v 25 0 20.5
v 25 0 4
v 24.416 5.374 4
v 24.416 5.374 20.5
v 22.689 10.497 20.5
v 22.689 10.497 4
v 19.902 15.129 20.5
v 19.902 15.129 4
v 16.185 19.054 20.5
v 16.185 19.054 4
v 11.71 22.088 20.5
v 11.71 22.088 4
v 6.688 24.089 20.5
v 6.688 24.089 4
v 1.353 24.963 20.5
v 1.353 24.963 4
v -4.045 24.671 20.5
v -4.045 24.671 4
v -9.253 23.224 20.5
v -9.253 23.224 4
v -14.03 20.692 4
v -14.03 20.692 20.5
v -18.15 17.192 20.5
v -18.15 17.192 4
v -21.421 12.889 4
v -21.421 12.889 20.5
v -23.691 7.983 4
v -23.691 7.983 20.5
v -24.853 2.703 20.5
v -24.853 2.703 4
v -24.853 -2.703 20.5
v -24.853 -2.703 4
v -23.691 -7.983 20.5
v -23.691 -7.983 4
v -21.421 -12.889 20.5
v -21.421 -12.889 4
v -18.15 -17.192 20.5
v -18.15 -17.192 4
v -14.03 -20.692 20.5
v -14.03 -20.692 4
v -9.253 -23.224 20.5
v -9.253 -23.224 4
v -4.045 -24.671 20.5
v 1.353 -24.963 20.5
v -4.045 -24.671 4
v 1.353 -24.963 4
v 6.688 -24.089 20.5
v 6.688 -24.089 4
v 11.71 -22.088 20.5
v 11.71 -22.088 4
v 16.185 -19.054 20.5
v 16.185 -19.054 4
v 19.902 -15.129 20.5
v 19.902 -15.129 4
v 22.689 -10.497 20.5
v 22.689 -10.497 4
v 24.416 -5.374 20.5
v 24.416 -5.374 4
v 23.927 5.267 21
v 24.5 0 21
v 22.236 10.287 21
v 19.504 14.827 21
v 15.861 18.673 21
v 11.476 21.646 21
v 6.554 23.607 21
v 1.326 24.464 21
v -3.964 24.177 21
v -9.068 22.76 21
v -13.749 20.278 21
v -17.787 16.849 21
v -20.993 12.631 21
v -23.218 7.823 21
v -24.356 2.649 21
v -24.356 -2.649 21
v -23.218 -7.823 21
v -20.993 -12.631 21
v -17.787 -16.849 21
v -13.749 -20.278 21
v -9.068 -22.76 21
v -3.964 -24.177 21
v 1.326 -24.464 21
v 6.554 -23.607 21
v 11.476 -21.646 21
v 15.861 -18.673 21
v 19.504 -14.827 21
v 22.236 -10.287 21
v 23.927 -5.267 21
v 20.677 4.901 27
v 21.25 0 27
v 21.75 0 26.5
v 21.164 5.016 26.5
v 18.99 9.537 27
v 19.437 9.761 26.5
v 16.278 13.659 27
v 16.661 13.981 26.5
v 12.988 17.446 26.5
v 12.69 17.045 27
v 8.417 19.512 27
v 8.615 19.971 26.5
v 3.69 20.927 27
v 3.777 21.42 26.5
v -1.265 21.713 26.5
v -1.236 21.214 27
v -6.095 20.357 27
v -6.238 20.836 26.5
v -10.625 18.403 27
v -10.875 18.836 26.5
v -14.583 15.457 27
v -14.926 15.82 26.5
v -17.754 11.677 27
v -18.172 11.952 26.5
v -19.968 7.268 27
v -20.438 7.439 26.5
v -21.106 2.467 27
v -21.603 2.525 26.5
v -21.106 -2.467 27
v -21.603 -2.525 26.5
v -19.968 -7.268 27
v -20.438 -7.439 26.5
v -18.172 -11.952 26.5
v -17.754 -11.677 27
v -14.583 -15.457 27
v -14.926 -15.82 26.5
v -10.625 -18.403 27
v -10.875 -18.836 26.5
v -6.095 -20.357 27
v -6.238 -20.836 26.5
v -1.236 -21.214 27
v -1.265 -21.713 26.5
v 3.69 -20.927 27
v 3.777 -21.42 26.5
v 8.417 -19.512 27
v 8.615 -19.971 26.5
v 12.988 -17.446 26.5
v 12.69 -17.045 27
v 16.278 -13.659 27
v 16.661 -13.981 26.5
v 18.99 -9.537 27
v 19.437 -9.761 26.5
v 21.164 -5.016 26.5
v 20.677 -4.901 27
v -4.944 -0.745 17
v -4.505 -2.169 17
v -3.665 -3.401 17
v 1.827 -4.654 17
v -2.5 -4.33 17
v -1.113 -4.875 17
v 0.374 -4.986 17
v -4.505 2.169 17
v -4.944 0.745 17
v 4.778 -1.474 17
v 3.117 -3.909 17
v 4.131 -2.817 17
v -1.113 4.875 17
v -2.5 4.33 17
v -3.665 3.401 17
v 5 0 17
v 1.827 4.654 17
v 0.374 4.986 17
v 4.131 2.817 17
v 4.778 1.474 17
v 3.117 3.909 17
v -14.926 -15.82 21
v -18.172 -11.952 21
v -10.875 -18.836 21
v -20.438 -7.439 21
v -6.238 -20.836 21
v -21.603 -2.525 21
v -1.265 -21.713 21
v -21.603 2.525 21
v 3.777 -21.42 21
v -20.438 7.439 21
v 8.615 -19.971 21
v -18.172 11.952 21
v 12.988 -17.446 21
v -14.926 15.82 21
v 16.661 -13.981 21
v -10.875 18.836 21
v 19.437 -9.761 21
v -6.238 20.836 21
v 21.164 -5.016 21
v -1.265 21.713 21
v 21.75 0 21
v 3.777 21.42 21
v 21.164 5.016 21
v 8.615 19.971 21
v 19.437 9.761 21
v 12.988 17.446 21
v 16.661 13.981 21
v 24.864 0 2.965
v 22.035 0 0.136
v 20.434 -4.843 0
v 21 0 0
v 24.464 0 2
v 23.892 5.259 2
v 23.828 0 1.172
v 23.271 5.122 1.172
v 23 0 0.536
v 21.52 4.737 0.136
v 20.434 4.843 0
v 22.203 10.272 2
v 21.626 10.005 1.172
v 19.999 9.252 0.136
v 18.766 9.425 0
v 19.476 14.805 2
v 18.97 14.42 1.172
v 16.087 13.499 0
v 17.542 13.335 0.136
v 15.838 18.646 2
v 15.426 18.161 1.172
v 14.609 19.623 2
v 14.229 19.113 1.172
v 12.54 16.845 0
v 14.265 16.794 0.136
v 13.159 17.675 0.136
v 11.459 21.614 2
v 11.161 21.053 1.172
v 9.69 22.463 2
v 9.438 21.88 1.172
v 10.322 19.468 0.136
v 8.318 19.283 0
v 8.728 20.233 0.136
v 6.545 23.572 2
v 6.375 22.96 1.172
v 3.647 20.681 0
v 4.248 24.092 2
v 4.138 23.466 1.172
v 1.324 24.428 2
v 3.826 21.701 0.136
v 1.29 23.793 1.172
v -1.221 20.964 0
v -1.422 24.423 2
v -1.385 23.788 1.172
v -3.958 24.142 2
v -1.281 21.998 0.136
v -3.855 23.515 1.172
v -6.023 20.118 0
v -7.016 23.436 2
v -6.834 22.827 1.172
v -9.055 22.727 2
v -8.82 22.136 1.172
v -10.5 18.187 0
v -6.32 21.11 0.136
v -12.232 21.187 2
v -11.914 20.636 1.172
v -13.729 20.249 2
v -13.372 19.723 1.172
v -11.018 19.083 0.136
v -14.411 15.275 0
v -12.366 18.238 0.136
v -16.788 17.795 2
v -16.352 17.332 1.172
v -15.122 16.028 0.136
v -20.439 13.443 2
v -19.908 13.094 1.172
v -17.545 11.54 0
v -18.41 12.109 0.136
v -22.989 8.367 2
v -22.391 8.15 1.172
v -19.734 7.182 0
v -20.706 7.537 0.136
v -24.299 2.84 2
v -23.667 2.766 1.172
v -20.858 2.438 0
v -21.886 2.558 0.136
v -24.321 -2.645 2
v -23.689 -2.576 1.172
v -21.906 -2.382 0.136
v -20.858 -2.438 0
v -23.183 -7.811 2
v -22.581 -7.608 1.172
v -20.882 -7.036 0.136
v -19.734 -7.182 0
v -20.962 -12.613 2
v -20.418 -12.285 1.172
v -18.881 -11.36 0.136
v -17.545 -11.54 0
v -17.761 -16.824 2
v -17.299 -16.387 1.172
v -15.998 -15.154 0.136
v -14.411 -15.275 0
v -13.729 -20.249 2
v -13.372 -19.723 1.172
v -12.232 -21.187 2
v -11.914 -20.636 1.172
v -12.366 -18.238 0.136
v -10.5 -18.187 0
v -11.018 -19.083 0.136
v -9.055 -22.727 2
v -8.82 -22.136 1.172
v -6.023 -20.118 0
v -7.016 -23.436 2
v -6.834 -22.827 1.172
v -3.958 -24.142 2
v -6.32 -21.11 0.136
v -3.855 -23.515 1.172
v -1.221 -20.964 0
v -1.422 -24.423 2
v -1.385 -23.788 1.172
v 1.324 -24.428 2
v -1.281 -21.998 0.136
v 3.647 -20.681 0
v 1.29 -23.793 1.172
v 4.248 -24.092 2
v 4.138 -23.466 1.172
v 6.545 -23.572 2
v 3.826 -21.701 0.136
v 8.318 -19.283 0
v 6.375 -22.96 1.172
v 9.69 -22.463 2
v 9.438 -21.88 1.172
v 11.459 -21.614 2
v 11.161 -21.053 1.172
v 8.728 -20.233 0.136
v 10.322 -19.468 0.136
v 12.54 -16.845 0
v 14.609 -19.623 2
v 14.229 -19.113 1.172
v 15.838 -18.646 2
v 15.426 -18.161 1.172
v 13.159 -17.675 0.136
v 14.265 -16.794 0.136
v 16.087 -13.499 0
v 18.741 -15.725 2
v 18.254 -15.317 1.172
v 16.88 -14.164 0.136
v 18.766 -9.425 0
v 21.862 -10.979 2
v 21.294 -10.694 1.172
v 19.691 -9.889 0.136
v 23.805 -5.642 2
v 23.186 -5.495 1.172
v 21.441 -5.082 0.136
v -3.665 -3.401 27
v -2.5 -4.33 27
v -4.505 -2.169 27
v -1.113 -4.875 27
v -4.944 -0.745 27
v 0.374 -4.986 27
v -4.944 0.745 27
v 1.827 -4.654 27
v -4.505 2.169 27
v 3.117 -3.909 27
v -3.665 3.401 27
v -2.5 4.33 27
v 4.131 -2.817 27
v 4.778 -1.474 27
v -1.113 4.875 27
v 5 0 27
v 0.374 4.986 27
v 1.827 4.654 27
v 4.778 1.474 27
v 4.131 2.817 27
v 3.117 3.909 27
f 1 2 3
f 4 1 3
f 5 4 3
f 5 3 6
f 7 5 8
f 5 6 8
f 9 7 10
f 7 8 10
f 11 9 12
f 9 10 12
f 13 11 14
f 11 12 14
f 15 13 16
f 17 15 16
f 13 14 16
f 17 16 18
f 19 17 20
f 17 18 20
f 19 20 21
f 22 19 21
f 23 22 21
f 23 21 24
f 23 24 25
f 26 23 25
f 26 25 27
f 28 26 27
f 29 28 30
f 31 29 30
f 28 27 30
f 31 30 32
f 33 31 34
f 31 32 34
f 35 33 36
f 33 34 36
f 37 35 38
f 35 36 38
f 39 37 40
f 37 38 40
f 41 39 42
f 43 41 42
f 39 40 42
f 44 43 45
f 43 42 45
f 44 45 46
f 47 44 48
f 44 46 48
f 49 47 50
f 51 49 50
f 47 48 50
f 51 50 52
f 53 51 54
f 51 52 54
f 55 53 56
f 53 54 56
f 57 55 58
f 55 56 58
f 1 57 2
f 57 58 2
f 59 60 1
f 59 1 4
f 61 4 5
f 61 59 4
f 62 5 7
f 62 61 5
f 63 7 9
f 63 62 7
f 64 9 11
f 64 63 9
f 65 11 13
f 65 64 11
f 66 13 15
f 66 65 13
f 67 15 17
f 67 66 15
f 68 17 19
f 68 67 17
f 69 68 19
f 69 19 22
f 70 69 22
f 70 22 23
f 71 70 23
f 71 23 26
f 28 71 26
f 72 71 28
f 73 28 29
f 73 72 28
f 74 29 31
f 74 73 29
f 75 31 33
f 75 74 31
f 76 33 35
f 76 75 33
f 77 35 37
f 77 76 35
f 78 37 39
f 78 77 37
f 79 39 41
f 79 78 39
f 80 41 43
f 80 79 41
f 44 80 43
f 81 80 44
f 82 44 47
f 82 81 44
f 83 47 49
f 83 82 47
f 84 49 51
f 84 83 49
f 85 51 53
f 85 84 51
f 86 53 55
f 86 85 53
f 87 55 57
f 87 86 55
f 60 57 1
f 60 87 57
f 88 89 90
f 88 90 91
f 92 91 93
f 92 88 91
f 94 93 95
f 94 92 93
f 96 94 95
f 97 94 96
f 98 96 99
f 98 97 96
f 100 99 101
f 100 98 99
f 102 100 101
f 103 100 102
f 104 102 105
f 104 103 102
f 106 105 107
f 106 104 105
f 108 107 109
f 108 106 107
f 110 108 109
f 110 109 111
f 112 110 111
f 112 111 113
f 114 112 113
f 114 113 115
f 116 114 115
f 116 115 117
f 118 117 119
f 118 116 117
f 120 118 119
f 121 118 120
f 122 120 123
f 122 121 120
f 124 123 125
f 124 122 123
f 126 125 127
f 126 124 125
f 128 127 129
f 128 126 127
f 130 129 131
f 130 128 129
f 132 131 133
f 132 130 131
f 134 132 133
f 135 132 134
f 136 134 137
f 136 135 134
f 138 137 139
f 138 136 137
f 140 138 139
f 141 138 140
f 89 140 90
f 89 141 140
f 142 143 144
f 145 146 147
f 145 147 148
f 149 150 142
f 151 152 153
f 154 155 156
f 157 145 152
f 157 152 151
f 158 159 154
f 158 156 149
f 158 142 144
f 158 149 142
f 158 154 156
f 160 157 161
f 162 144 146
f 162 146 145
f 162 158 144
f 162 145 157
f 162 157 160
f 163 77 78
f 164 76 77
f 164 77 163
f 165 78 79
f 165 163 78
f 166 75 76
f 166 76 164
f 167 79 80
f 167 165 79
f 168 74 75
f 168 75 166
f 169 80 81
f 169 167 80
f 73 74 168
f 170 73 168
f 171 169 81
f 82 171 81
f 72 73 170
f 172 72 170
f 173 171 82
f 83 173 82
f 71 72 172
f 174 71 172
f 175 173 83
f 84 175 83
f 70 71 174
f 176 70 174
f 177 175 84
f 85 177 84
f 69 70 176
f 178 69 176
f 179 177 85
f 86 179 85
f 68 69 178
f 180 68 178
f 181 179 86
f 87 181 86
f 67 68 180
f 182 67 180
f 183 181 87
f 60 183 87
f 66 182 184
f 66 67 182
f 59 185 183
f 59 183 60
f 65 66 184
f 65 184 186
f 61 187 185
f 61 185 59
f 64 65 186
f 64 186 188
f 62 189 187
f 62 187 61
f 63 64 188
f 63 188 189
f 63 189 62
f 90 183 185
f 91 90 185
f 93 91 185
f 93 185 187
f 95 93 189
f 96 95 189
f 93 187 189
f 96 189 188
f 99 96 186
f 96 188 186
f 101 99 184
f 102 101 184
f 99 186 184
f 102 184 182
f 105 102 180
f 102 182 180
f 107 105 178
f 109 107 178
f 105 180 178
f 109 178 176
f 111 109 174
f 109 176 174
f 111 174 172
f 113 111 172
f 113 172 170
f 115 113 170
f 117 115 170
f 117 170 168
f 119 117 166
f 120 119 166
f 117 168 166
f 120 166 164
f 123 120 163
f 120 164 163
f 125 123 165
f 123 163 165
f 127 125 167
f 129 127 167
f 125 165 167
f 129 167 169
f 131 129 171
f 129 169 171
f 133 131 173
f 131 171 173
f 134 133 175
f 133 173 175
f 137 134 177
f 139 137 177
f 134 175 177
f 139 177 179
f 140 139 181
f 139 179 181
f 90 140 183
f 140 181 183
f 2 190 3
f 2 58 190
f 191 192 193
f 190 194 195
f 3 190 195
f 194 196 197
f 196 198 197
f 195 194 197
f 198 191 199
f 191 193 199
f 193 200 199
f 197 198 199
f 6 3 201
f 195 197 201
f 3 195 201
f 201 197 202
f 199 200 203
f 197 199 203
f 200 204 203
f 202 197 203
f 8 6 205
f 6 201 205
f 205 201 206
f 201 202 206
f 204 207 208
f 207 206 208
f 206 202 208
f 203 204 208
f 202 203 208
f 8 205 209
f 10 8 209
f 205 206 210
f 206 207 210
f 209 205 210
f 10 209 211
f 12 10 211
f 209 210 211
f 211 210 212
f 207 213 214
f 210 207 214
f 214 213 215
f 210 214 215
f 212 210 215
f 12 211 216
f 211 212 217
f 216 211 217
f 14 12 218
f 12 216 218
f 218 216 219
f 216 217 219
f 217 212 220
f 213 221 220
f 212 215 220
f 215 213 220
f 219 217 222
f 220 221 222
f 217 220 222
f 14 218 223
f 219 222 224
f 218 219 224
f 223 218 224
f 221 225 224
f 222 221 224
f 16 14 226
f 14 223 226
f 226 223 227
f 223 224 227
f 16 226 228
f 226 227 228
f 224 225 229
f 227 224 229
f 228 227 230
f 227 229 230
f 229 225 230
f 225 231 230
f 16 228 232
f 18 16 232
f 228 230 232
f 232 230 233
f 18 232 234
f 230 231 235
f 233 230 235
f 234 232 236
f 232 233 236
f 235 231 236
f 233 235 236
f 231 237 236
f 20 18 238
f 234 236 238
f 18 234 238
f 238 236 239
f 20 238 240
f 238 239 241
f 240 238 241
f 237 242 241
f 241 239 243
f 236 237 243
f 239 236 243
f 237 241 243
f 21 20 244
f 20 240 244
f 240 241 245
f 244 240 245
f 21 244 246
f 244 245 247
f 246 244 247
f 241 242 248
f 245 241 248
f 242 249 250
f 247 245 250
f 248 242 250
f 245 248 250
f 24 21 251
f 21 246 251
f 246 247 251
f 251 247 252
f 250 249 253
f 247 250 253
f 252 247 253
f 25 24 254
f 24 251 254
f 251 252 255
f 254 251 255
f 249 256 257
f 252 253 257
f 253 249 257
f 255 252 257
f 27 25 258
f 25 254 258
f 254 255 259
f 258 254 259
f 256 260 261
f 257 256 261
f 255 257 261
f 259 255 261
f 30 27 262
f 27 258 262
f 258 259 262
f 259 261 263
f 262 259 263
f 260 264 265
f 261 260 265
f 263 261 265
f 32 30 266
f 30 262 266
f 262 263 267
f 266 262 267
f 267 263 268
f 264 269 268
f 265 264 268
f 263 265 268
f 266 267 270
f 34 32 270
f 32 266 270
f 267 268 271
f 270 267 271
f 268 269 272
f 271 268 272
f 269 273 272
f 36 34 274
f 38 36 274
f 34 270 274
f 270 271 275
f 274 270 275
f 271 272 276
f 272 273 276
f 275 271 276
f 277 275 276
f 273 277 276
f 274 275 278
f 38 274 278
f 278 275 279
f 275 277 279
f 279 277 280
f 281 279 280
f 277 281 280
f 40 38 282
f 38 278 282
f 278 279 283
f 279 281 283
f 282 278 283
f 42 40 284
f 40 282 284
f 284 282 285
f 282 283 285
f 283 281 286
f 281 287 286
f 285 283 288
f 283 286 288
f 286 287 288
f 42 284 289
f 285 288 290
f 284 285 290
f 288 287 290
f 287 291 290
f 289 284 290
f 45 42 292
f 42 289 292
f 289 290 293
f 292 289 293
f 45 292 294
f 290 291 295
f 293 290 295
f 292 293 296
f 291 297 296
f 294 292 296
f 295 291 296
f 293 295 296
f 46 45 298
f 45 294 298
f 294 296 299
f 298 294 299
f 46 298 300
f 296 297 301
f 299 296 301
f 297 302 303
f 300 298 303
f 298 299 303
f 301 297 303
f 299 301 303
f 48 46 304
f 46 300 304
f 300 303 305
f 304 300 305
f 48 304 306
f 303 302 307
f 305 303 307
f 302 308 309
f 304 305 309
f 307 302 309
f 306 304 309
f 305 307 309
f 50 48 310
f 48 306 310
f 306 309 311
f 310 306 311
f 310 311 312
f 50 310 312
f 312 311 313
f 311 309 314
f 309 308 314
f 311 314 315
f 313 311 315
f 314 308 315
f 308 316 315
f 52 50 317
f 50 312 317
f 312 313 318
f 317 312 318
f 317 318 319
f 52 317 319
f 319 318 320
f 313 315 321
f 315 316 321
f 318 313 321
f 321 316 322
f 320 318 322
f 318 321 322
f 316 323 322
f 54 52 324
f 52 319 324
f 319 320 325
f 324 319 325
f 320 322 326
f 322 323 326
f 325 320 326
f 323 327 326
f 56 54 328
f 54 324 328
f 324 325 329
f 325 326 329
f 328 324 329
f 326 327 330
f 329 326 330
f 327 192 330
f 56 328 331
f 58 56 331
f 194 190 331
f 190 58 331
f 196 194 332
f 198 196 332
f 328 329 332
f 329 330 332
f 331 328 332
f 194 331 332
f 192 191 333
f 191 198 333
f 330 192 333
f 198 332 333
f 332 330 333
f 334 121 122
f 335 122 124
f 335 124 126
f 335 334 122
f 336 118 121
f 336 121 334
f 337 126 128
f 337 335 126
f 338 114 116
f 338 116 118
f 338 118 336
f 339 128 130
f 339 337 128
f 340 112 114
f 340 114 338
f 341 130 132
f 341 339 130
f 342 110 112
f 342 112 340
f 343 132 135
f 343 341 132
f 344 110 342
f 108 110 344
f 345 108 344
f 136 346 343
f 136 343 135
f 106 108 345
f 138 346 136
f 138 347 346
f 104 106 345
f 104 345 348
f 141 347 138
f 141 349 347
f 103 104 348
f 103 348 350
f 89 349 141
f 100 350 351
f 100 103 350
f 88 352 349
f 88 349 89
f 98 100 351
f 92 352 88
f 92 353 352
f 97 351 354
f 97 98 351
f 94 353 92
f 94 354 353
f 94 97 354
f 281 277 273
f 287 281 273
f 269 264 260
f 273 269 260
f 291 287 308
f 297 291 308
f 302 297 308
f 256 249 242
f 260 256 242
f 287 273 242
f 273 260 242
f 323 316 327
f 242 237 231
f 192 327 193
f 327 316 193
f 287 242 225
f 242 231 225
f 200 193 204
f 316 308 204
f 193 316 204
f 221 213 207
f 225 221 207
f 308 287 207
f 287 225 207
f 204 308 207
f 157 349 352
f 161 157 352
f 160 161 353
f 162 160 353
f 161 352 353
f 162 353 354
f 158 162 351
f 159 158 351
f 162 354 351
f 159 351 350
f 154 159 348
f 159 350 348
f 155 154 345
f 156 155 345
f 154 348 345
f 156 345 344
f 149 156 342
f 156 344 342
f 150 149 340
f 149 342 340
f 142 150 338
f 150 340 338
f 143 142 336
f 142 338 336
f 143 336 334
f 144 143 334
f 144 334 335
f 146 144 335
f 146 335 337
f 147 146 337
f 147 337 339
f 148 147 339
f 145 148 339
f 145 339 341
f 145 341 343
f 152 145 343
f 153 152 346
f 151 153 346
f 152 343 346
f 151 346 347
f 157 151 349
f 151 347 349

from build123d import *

# Parameters (mm, degrees)
F0_R     = 25
F1_DEPTH = 21
F2_R     = 21.75
F3_DEPTH = 6
F4_R     = 5
F5_DEPTH = 10
F6_SIZE  = 0.5
F7_R     = 4


with BuildPart() as f1:
    # F0 (on Top) → F1 (new body)
    with BuildSketch(Plane.XY):
        Circle(F0_R)
    extrude(amount=F1_DEPTH)

    # F2 (on face) → F3 (join)
    with BuildSketch(Plane.XY.offset(21)):
        Circle(F2_R)
    extrude(amount=F3_DEPTH)

    # F4 (on face) → F5 (cut)
    with BuildSketch(Plane.XY.offset(27)):
        Circle(F4_R)
    extrude(amount=-F5_DEPTH, mode=Mode.SUBTRACT)

    # F6
    f6_edges = [f1.edges().sort_by_distance(p)[0] for p in [
        (-21.75, 0, 27),
        (-25, 0, 21),
    ]]
    chamfer(f6_edges, length=F6_SIZE)

    # F7
    f7_edges = [f1.edges().sort_by_distance(p)[0] for p in [
        (-25, 0, 0),
    ]]
    fillet(f7_edges, radius=F7_R)


solid = f1.part
